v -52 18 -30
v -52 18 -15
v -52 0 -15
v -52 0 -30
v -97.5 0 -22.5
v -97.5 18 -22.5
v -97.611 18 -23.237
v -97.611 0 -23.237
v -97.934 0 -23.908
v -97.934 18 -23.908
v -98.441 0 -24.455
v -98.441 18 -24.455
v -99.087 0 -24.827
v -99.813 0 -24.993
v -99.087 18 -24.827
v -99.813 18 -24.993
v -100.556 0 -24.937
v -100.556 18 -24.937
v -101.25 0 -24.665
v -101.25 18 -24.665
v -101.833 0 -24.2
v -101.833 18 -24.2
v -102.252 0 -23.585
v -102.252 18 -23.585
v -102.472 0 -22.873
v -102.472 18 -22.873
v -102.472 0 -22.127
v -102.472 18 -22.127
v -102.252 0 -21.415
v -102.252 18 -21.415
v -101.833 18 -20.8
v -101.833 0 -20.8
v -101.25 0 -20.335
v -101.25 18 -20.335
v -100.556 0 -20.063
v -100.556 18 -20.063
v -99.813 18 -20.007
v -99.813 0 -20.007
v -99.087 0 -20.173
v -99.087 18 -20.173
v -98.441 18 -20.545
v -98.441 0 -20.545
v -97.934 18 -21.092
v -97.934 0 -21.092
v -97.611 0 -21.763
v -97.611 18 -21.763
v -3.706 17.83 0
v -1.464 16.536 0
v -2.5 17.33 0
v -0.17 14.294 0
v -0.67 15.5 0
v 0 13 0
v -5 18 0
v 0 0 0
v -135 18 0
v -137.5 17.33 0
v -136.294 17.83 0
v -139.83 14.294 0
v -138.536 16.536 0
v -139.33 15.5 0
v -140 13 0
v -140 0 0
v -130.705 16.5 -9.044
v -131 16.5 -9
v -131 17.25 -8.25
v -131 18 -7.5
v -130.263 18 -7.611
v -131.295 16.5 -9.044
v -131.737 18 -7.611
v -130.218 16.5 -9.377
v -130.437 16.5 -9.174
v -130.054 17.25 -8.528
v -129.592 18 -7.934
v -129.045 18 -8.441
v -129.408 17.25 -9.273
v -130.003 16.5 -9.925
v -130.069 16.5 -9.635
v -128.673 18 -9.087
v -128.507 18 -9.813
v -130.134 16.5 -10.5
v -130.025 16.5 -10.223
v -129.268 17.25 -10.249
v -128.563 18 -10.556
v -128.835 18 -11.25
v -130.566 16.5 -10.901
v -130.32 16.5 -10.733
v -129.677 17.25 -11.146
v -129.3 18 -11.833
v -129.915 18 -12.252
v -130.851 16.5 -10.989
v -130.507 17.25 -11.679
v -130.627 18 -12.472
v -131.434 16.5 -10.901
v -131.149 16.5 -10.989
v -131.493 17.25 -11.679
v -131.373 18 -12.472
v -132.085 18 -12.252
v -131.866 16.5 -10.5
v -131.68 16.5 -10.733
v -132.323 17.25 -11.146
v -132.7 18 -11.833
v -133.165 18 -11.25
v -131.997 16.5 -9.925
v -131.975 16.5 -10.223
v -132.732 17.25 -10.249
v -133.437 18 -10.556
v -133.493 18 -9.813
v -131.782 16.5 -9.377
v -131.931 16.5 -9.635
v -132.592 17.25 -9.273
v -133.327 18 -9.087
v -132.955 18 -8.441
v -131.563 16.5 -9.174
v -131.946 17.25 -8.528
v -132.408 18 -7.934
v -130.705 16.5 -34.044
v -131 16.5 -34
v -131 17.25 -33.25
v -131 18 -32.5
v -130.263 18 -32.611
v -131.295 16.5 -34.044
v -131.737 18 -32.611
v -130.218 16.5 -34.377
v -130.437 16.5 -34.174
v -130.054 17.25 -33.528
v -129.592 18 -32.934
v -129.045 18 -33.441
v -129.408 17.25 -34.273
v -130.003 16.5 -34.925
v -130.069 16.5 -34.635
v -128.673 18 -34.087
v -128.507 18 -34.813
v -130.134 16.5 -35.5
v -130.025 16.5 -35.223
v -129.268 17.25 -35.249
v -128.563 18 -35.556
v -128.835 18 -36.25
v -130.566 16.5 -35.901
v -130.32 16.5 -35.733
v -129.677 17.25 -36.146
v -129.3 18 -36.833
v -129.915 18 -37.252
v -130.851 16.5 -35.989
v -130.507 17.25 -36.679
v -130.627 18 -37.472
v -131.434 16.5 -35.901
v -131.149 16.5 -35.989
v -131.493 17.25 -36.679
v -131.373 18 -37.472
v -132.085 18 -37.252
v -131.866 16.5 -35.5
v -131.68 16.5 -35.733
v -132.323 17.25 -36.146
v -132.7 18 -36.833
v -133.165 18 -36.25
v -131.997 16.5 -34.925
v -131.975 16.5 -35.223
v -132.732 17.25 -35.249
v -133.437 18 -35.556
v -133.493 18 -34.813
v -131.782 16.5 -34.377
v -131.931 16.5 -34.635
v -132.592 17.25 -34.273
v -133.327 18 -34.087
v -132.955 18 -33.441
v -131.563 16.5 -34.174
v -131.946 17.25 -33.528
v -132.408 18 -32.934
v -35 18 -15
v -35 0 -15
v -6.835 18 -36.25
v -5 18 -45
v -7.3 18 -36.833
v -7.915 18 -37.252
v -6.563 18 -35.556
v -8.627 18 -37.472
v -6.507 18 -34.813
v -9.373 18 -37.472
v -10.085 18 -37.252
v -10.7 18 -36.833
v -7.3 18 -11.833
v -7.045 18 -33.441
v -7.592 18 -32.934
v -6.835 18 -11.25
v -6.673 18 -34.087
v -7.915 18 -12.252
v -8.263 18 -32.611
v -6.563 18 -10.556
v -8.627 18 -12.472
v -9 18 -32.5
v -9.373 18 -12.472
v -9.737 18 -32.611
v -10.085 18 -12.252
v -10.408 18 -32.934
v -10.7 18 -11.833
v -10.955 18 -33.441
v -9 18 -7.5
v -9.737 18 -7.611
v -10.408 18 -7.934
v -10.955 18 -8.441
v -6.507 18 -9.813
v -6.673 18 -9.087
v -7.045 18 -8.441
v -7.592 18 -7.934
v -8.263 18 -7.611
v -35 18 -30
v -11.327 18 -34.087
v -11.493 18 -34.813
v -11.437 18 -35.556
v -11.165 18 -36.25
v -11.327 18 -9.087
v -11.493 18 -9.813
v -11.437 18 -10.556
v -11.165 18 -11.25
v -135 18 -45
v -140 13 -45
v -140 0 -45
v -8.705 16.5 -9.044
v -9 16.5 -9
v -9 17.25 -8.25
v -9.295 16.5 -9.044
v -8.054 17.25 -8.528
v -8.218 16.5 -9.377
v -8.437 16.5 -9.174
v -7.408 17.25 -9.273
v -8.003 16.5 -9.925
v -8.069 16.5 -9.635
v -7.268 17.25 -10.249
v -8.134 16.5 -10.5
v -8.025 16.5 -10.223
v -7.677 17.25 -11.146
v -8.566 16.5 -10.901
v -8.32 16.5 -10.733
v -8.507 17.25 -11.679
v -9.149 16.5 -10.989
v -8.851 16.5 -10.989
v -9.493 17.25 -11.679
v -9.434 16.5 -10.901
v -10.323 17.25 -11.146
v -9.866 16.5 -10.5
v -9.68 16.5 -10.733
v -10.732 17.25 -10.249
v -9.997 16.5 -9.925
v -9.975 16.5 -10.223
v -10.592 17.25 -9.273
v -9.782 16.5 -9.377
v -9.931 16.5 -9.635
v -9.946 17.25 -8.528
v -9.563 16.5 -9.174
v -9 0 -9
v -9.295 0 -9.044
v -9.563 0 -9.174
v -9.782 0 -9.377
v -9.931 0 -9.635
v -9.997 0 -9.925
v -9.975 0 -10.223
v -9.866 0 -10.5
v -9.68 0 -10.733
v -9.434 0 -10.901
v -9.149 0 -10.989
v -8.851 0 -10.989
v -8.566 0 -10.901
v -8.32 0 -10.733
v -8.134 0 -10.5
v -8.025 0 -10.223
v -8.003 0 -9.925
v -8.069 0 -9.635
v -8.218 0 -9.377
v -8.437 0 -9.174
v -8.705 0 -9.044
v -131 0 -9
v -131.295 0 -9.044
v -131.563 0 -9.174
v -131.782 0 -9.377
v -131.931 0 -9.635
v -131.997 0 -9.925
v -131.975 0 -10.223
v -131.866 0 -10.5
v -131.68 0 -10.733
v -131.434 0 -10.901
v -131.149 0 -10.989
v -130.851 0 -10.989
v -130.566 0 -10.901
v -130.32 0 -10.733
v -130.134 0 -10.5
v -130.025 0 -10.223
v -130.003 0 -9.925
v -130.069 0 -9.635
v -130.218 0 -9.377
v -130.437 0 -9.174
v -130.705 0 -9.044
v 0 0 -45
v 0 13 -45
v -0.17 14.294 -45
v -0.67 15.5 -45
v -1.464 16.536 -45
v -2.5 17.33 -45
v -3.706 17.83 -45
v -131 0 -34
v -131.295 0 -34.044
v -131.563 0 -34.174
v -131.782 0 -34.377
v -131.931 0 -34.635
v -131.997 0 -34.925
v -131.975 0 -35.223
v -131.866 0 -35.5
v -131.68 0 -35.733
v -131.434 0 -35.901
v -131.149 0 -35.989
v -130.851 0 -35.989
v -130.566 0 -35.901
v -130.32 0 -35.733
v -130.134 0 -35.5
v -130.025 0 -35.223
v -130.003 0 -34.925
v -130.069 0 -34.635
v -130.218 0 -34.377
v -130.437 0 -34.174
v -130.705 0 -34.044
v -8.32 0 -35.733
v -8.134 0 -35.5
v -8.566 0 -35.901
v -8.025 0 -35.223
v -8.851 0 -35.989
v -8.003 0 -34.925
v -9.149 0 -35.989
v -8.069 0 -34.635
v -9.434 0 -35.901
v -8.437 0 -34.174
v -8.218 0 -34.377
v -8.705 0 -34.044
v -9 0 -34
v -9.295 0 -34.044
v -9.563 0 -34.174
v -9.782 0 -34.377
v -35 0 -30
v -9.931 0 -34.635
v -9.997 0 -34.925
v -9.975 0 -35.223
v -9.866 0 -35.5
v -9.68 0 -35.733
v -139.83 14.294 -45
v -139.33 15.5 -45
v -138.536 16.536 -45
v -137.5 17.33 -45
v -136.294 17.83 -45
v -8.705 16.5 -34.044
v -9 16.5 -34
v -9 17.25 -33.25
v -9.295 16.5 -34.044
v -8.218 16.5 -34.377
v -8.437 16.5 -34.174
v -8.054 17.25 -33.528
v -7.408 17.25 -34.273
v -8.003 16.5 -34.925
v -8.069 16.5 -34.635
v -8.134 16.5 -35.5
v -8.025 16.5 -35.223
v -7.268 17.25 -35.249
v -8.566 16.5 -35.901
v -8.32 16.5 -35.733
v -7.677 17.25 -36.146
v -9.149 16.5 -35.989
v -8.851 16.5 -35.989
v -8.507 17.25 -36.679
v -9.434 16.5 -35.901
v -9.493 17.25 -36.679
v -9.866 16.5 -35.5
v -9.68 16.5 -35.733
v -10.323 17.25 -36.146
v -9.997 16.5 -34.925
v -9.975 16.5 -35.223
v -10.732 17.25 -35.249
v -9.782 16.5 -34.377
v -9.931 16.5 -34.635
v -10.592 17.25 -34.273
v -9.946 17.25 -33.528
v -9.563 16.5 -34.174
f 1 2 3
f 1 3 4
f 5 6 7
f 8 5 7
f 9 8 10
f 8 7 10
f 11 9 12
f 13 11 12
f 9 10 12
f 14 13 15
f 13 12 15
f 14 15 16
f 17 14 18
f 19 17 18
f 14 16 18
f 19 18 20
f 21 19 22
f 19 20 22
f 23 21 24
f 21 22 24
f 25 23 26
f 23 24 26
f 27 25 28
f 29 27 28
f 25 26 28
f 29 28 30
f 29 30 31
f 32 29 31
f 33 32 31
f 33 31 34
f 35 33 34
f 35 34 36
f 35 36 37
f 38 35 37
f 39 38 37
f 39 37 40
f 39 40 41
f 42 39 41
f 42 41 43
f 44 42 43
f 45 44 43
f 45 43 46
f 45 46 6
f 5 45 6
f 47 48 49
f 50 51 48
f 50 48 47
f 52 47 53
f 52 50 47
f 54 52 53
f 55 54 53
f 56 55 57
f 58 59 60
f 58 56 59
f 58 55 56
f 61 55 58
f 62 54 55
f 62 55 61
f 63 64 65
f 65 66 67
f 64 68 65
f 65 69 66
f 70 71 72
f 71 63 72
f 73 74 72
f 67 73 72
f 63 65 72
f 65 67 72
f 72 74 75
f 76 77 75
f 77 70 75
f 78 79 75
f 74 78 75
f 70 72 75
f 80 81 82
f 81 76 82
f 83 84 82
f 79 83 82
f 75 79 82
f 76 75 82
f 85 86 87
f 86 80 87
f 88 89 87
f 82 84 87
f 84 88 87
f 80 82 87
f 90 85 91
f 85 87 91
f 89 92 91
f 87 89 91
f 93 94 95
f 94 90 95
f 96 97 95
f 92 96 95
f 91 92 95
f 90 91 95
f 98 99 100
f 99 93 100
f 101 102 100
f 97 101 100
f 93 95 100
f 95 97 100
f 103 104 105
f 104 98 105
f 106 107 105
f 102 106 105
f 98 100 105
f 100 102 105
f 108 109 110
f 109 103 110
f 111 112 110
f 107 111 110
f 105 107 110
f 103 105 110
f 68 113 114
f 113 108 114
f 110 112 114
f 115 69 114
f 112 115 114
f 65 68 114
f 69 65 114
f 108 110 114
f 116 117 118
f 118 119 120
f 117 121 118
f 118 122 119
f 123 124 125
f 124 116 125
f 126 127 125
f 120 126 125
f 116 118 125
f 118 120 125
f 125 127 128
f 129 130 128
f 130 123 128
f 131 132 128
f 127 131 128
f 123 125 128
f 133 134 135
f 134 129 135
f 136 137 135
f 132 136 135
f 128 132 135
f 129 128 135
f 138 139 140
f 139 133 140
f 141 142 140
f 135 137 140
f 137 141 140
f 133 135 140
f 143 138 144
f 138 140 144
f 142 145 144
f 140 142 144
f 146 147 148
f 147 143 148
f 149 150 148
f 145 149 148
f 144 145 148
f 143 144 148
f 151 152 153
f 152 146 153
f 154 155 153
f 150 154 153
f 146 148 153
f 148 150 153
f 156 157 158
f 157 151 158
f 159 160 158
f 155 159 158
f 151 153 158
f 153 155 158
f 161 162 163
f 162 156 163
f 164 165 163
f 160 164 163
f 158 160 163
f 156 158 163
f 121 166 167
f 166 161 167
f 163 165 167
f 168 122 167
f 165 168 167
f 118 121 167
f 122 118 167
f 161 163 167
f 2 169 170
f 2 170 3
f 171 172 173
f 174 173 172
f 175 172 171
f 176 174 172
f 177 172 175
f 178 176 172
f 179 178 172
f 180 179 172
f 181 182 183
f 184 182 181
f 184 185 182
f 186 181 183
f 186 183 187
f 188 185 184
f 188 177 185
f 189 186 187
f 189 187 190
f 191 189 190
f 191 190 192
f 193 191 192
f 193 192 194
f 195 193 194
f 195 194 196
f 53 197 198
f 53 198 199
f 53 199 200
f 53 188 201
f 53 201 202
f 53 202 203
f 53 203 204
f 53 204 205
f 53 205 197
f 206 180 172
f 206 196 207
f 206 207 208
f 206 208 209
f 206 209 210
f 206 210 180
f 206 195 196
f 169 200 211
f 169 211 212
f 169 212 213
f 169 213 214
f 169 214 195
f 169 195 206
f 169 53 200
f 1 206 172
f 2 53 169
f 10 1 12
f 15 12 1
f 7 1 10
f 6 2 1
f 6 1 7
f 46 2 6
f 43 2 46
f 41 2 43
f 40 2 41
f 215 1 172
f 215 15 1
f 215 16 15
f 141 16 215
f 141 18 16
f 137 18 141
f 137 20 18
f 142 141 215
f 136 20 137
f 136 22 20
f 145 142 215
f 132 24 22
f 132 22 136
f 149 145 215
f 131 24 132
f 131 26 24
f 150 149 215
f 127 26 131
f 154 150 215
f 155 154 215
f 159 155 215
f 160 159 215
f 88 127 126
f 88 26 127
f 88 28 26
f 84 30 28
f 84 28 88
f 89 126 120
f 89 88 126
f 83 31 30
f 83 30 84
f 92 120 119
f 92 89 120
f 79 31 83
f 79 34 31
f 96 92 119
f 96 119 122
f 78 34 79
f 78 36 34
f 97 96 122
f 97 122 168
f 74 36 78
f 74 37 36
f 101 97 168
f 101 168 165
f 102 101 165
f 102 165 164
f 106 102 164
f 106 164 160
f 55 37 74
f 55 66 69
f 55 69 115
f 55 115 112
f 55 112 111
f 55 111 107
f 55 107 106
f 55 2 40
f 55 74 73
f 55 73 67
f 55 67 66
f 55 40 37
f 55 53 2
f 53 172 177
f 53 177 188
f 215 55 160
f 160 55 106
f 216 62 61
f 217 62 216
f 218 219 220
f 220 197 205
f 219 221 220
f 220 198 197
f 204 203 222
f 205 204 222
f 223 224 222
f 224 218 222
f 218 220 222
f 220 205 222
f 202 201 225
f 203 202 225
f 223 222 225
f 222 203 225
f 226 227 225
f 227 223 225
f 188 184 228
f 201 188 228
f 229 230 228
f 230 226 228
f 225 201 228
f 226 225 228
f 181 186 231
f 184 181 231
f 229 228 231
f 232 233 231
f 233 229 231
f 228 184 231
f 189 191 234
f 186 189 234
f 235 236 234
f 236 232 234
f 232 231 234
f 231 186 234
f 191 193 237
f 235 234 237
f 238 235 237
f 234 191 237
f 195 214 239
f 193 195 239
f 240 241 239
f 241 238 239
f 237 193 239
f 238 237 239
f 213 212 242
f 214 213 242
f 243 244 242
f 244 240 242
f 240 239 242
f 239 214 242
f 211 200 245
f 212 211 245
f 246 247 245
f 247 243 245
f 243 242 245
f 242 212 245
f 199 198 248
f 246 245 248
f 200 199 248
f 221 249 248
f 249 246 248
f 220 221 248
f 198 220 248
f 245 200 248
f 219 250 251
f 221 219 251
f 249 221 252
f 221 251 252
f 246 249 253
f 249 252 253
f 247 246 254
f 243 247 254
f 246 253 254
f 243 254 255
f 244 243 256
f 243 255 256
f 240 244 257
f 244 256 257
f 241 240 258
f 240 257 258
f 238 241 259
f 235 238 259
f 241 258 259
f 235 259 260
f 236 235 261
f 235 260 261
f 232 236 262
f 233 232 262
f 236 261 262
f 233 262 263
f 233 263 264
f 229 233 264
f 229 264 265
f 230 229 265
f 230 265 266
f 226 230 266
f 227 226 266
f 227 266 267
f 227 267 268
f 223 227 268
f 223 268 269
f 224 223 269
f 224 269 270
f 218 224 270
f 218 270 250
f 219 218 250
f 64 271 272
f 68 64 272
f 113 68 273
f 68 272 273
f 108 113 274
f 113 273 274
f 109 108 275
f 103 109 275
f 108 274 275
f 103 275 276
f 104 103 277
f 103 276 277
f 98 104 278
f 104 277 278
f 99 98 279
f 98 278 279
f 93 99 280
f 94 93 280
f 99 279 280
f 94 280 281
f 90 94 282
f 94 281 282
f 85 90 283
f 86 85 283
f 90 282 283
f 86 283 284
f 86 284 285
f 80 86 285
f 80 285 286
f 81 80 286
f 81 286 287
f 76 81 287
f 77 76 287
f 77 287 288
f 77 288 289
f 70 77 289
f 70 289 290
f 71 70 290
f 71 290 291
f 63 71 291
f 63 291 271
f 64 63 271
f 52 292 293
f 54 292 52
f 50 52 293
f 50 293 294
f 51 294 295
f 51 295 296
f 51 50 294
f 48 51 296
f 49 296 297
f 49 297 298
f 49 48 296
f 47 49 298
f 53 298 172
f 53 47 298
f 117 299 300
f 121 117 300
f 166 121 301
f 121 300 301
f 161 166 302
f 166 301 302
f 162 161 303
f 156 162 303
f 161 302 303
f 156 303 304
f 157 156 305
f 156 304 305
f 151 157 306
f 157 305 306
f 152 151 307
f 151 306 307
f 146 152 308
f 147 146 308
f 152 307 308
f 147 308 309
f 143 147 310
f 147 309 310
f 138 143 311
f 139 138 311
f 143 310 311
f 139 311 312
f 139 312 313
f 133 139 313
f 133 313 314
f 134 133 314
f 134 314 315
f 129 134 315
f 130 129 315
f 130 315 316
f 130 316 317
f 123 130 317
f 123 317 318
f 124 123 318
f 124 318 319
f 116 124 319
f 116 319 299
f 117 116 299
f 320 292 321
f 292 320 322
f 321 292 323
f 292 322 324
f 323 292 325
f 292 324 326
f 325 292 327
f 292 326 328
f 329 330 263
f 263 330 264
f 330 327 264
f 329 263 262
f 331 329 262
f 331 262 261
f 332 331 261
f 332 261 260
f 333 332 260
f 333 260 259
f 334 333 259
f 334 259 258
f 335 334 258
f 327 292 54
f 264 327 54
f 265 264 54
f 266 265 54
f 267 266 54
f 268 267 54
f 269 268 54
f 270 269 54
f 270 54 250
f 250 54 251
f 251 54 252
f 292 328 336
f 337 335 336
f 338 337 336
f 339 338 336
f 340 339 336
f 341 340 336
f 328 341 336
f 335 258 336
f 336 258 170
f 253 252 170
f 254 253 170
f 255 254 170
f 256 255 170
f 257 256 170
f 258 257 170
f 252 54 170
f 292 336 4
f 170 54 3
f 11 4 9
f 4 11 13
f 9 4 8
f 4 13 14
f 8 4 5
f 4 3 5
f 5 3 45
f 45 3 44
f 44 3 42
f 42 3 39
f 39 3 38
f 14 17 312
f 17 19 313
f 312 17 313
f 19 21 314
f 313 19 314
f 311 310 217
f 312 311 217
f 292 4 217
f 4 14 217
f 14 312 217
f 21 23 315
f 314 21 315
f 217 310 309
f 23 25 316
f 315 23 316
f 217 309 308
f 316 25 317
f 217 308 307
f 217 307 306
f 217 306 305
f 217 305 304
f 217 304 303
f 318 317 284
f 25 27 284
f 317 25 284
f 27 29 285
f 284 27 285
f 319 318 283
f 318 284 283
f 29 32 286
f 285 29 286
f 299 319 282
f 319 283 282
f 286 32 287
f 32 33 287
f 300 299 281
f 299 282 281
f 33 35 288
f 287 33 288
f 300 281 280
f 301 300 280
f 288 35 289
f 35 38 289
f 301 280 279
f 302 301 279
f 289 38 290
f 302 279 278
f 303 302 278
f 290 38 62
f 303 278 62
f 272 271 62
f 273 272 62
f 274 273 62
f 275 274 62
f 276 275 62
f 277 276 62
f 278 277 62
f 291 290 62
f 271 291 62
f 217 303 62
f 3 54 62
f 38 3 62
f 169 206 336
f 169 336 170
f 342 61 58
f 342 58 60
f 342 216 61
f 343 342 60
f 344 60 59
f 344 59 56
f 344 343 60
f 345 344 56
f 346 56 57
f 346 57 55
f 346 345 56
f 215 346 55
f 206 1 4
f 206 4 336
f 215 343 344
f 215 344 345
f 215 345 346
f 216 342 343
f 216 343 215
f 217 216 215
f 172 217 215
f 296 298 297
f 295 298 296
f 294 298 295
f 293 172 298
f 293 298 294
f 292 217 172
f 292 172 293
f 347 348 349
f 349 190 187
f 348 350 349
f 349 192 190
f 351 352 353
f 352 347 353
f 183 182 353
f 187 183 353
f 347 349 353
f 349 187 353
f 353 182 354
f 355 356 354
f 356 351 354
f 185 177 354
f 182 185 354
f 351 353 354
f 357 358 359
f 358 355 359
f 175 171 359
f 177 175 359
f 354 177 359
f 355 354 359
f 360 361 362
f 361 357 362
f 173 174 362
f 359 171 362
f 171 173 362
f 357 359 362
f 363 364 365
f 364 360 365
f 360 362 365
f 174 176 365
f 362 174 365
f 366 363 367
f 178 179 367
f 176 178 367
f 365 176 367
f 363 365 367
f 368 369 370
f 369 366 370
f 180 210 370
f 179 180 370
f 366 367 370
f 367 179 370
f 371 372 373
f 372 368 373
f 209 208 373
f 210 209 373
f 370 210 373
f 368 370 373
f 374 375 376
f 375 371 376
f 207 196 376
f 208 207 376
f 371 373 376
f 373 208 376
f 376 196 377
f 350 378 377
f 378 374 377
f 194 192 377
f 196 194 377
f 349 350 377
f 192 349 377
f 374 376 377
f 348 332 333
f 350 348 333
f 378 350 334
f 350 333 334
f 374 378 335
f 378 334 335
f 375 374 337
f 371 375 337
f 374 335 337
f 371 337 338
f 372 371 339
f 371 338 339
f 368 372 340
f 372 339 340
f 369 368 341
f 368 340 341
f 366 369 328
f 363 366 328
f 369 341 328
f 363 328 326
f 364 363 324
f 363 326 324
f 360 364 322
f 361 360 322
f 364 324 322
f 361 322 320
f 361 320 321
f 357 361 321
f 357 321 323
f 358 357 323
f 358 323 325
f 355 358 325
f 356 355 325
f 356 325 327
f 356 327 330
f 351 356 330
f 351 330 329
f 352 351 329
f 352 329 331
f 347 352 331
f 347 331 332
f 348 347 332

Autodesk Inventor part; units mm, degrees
ref_plane "YZ Plane" through (0, 0, 0) normal (1, 0, 0) x (0, 1, 0)
ref_plane "XZ Plane" through (0, 0, 0) normal (0, 1, 0) x (-1, 0, 0)
ref_plane "XY Plane" through (0, 0, 0) normal (0, 0, 1) x (1, 0, 0)
sketch "Skizze1" plane through (0, 0, 0) normal (0, 1, 0) x (-1, 0, 0)
  line L0 (0, 0) -> (140, 0)
  line L1 (140, 0) -> (140, -45)
  line L2 (140, -45) -> (0, -45)
  line L3 (0, -45) -> (0, 0)
  dimension "d0" = 140
  dimension "d1" = 45
extrude "Extrusion1" add sketch "Skizze1" along normal blind 18
sketch "Skizze2" plane through (0, 18, 0) normal (0, 1, 0) x (1, 0, 0)
  line L0 (0, 0) -> (0, 45) projected
  line L1 (0, 45) -> (-140, 45) projected
  line L2 (-140, 45) -> (-140, 0) projected
  point P0 (-131, 35)
  point P1 (-131, 10)
  point P2 (-9, 35)
  point P3 (-9, 10)
  dimension "d14" = 10
  dimension "d15" = 25
  dimension "d16" = 10
  dimension "d17" = 25
  dimension "d18" = 9
  dimension "d19" = 9
hole "Bohrung1" at (-131, 18, -35) at (-131, 18, -10) at (-9, 18, -35) at (-9, 18, -10) direction (0, -1, 0) diameter 2 end through all countersink diameter 5 countersink angle 90
fillet "Rundung3" radius 5 2 edges at (0, 18, -22.5) (-140, 18, -22.5)
sketch "Skizze3" plane through (0, 18, 0) normal (0, 1, 0) x (1, 0, 0)
  line L0 (-135, 0) -> (-5, 0) projected
  line L1 (-35, 15) -> (-52, 15)
  line L2 (-52, 15) -> (-52, 30)
  line L3 (-52, 30) -> (-35, 30)
  line L4 (-35, 30) -> (-35, 15)
  line L5 (0, 0) -> (0, 45) projected
  line L6 (-140, 45) -> (-140, 0) projected
  circle A0 centre (-100, 22.5) radius 2.5
  dimension "d32" = 17
  dimension "d33" = 15
  dimension "d34" = 15
  dimension "d39" = 35
  dimension "d40" = 5
  dimension "d41" = 22.5
  dimension "d42" = 40
extrude "Extrusion3" cut sketch "Skizze3" against normal blind 18
properties part number "Seitenteil_mit_Sensoren" material "Eiche, weiß"
